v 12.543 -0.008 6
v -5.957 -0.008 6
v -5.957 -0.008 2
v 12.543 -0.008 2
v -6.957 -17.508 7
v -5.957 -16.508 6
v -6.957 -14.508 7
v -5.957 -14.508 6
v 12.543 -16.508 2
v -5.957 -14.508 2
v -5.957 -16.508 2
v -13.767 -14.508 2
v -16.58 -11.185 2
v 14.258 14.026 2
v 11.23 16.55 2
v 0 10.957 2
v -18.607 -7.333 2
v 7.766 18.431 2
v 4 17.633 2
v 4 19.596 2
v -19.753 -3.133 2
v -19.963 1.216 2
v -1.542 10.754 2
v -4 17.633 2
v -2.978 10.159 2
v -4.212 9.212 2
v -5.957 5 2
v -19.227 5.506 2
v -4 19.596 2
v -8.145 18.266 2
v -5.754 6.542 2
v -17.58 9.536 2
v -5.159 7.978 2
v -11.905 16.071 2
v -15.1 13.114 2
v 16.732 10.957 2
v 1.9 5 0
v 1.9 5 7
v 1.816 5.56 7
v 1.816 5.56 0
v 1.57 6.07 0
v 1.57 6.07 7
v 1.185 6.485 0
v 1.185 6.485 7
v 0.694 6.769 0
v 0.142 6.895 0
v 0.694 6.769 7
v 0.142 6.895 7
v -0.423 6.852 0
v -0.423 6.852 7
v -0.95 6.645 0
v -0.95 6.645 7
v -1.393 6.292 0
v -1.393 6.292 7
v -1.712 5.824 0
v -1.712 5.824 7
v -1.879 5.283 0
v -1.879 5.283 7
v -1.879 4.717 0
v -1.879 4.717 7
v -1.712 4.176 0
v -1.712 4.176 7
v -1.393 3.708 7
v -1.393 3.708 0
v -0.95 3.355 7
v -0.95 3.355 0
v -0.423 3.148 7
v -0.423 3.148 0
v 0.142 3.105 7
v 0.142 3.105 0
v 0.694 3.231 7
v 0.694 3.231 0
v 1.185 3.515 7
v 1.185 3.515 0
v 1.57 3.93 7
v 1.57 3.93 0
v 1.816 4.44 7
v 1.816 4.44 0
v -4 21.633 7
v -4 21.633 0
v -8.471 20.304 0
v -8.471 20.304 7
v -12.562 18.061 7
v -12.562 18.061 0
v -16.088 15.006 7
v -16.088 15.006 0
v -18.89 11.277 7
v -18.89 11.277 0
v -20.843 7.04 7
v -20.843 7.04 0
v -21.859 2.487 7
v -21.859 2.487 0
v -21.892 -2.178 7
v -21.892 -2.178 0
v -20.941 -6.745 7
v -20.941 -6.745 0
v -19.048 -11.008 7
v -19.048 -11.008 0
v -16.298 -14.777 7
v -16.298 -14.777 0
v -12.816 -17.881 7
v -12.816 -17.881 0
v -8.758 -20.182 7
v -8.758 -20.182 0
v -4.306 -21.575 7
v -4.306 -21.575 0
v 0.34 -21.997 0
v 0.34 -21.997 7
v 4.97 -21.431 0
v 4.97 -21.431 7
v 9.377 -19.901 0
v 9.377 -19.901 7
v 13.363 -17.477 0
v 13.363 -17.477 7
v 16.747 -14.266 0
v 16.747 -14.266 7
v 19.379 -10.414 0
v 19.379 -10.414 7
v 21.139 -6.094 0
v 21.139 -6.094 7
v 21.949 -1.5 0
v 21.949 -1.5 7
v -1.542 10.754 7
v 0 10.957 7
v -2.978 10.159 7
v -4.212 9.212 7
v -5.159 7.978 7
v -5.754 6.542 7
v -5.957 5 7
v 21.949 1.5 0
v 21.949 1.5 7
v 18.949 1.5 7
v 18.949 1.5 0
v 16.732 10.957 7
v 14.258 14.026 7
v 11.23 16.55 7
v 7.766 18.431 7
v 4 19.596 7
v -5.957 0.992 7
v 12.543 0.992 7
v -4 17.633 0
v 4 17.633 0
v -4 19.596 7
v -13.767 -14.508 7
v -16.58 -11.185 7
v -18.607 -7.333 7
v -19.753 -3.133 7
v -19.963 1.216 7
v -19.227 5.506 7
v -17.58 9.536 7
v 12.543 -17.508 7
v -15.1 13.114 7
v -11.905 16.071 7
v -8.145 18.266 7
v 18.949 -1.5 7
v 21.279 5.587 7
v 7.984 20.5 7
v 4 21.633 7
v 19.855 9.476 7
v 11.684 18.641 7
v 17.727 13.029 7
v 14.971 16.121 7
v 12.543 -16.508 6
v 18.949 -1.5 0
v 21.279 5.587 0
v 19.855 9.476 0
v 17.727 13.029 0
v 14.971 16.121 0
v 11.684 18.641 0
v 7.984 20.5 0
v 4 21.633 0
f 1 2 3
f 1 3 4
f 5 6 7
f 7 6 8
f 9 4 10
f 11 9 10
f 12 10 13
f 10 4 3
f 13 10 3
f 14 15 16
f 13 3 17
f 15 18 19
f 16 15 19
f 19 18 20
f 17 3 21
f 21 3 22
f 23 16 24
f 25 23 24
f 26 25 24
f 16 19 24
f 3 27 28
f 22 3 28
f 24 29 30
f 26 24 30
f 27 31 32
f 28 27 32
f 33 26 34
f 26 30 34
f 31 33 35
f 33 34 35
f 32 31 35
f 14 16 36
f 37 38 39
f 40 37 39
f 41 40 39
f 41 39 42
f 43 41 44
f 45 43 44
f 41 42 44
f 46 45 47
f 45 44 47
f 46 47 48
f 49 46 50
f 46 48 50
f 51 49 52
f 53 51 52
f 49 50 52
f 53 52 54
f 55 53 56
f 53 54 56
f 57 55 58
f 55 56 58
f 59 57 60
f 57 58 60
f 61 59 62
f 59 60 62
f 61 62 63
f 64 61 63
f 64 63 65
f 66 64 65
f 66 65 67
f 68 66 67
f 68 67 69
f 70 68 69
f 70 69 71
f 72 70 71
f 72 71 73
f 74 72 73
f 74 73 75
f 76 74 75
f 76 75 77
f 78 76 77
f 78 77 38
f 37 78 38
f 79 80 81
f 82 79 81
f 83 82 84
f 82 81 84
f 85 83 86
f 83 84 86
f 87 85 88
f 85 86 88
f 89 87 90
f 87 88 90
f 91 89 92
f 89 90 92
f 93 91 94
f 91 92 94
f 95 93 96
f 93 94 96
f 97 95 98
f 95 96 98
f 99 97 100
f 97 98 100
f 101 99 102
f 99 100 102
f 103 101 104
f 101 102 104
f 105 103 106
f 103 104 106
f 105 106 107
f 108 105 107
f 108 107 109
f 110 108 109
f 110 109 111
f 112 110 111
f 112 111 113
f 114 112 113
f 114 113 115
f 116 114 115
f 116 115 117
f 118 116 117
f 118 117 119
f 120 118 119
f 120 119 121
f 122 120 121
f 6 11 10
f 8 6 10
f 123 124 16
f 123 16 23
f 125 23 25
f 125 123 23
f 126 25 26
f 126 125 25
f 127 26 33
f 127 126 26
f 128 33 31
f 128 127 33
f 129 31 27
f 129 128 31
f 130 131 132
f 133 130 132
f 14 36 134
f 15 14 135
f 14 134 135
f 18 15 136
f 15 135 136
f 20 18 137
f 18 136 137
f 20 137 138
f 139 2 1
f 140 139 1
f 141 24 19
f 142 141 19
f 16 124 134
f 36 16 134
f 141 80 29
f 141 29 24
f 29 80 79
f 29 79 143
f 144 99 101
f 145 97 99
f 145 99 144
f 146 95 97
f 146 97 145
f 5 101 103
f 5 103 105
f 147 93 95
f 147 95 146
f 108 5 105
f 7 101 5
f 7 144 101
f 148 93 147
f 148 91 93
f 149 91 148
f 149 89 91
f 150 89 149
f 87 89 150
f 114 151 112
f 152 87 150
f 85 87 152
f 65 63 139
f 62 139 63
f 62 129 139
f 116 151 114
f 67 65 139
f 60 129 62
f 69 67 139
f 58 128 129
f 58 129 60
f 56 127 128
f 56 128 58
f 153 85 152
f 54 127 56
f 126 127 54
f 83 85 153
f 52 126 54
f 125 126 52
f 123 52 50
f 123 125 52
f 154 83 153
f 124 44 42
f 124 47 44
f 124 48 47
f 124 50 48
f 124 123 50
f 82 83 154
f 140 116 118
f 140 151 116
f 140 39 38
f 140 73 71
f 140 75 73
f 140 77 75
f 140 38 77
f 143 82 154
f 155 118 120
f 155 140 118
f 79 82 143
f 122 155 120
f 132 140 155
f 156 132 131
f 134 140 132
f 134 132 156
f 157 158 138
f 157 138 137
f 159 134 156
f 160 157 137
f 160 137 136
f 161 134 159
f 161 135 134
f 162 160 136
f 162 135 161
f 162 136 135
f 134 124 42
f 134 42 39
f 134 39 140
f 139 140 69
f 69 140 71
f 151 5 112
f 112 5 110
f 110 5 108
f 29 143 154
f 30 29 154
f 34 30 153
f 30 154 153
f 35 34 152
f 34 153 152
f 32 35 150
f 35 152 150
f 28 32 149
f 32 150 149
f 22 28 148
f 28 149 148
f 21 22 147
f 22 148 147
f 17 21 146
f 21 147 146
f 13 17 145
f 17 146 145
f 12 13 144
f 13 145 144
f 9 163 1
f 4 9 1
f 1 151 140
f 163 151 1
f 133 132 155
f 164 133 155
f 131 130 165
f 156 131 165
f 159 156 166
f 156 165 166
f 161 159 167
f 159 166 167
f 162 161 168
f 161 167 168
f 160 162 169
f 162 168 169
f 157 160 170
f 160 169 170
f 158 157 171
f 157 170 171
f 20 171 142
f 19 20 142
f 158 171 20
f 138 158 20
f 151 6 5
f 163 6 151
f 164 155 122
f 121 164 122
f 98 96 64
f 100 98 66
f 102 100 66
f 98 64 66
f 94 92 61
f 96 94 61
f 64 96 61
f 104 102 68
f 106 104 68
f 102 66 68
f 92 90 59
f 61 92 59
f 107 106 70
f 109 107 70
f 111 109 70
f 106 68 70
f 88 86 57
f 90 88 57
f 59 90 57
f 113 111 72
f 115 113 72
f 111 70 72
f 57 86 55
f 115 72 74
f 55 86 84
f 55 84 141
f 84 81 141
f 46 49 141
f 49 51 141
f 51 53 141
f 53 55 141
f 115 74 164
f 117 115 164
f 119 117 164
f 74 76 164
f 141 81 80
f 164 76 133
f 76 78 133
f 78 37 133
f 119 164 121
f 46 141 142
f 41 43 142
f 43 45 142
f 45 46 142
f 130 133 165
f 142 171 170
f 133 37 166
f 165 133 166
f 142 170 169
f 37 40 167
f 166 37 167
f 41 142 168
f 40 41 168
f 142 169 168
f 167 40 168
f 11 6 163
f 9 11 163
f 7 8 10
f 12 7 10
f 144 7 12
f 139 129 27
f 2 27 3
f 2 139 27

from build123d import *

# Parameters (mm, degrees)
SKETCH_R        = 22
PAD_DEPTH       = 7
SKETCH001_R     = 1.9
POCKET_DEPTH    = 7.001
POCKET001_DEPTH = 7.001
SKETCH003_W     = 18.5
SKETCH003_H     = 16.5
POCKET002_DEPTH = 5
POCKET003_DEPTH = 7.001
POCKET004_DEPTH = 5
CHAMFER_SIZE    = 1
CHAMFER001_SIZE = 1
CHAMFER002_SIZE = 1


with BuildPart() as part:
    # Sketch → Pad (new body)
    with BuildSketch(Plane.XY):
        Circle(SKETCH_R)
    extrude(amount=PAD_DEPTH)

    # Sketch001 → Pocket (cut, through all)
    with BuildSketch(Plane.XY.offset(7)):
        with Locations((0, 5)):
            Circle(SKETCH001_R)
    extrude(amount=-POCKET_DEPTH, mode=Mode.SUBTRACT)

    # Sketch002 → Pocket001 (cut, through all)
    with BuildSketch(Plane.XY.offset(7)):
        with BuildLine():
            ThreePointArc((21.948804, -1.5), (22, 0), (21.948804, 1.5))
            Line((21.948804, 1.5), (18.948804, 1.5))
            Line((18.948804, 1.5), (18.948804, -1.5))
            Line((18.948804, -1.5), (21.948804, -1.5))
        make_face()
    extrude(amount=-POCKET001_DEPTH, mode=Mode.SUBTRACT)

    # Sketch003 → Pocket002 (cut)
    with BuildSketch(Plane.XY.offset(7)):
        with Locations((3.293337, -8.257713)):
            Rectangle(SKETCH003_W, SKETCH003_H)
    extrude(amount=-POCKET002_DEPTH, mode=Mode.SUBTRACT)

    # Sketch004 → Pocket003 (cut, through all)
    with BuildSketch(Plane.XY.offset(7)):
        with BuildLine():
            ThreePointArc((4, 21.633308), (0, 22), (-4, 21.633308))
            Line((-4, 21.633308), (-4, 17.633308))
            Line((-4, 17.633308), (4, 17.633308))
            Line((4, 21.633308), (4, 17.633308))
        make_face()
    extrude(amount=-POCKET003_DEPTH, mode=Mode.SUBTRACT)

    # Sketch005 → Pocket004 (cut)
    with BuildSketch(Plane.XY.offset(7)):
        with BuildLine():
            ThreePointArc((0, 10.956663), (-4.212006, 9.211988), (-5.956663, 4.999975))
            Line((-5.956663, 4.999975), (-5.956663, -14.507713))
            Line((-5.956663, -14.507713), (-13.766854, -14.507713))
            ThreePointArc((16.731752, 10.956663), (-12.818201, 15.35232), (-13.766854, -14.507713))
            Line((0, 10.956663), (16.731752, 10.956663))
        make_face()
    extrude(amount=-POCKET004_DEPTH, mode=Mode.SUBTRACT)

    # Chamfer
    chamfer_edges = [part.edges().sort_by_distance(p)[0] for p in [
        (3.293337, -0.007713, 7),
    ]]
    chamfer(chamfer_edges, length=CHAMFER_SIZE)

    # Chamfer001
    chamfer001_edges = [part.edges().sort_by_distance(p)[0] for p in [
        (3.293337, -16.507713, 7),
    ]]
    chamfer(chamfer001_edges, length=CHAMFER001_SIZE)

    # Chamfer002
    chamfer002_edges = [part.edges().sort_by_distance(p)[0] for p in [
        (-5.956663, -15.507713, 7),
    ]]
    chamfer(chamfer002_edges, length=CHAMFER002_SIZE)


solid = part.part
